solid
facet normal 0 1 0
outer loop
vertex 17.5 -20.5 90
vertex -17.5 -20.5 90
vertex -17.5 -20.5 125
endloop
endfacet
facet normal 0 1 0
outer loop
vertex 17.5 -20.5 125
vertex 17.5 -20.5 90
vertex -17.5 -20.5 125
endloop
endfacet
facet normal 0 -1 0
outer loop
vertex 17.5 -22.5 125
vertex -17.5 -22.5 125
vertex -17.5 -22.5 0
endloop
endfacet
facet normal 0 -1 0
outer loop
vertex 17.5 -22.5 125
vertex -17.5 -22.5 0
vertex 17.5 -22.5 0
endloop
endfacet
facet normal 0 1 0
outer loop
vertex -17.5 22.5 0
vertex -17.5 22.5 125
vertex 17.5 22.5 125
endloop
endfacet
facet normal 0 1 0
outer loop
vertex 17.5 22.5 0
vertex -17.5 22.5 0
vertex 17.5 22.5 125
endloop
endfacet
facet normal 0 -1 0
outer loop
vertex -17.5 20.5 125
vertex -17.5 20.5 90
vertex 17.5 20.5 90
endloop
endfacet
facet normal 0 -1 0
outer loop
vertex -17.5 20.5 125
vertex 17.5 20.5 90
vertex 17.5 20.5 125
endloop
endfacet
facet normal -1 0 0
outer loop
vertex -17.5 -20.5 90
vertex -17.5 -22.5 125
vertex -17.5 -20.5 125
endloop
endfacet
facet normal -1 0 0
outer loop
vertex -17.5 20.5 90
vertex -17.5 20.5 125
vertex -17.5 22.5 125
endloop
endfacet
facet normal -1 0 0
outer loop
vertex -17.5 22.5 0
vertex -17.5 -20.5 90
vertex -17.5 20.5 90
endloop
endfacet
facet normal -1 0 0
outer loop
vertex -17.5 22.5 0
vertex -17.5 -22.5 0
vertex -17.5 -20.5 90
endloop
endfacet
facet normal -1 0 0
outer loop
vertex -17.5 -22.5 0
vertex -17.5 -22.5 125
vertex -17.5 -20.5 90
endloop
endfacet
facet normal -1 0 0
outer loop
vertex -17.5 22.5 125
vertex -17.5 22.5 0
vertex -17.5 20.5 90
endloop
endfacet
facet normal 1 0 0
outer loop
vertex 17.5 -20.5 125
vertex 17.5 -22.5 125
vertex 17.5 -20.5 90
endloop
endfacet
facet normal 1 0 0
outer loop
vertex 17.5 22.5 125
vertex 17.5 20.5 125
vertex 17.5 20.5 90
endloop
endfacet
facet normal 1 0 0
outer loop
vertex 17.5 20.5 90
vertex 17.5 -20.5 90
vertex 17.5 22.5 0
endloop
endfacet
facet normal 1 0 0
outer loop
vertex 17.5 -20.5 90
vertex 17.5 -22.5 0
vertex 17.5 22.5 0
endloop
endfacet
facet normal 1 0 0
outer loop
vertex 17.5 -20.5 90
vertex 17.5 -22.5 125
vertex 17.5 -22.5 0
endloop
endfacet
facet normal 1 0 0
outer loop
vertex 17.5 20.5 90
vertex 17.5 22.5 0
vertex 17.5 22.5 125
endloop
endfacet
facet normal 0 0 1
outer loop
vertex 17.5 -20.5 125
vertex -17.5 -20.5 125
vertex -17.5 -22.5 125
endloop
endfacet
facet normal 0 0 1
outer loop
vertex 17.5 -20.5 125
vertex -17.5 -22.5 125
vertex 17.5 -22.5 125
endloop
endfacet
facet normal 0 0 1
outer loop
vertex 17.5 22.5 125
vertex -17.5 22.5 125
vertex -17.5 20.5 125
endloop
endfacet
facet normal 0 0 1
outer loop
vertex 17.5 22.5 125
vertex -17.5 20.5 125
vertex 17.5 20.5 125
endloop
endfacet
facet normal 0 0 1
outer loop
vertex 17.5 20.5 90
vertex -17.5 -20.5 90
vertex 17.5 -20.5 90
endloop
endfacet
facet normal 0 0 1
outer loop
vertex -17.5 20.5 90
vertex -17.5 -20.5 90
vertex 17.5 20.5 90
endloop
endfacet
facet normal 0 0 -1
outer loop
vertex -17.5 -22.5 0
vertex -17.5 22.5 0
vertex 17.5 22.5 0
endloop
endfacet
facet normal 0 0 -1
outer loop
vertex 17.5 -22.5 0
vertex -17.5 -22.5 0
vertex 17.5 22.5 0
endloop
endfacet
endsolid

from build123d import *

# Parameters (mm, degrees)
SKETCH1_W           = 35
SKETCH1_H           = 45
BOSS_EXTRUDE1_DEPTH = 125
SKETCH2_W           = 35
SKETCH2_H           = 41
CUT_EXTRUDE1_DEPTH  = 36


with BuildPart() as part:
    # Sketch1 → Boss-Extrude1 (new body)
    with BuildSketch(Plane.XY):
        Rectangle(SKETCH1_W, SKETCH1_H)
    extrude(amount=BOSS_EXTRUDE1_DEPTH)

    # Sketch2 → Cut-Extrude1 (cut, through all)
    with BuildSketch(Plane.ZY.offset(17.5)):
        with Locations((107.5, 0)):
            Rectangle(SKETCH2_W, SKETCH2_H)
    extrude(amount=-CUT_EXTRUDE1_DEPTH, mode=Mode.SUBTRACT)


solid = part.part
